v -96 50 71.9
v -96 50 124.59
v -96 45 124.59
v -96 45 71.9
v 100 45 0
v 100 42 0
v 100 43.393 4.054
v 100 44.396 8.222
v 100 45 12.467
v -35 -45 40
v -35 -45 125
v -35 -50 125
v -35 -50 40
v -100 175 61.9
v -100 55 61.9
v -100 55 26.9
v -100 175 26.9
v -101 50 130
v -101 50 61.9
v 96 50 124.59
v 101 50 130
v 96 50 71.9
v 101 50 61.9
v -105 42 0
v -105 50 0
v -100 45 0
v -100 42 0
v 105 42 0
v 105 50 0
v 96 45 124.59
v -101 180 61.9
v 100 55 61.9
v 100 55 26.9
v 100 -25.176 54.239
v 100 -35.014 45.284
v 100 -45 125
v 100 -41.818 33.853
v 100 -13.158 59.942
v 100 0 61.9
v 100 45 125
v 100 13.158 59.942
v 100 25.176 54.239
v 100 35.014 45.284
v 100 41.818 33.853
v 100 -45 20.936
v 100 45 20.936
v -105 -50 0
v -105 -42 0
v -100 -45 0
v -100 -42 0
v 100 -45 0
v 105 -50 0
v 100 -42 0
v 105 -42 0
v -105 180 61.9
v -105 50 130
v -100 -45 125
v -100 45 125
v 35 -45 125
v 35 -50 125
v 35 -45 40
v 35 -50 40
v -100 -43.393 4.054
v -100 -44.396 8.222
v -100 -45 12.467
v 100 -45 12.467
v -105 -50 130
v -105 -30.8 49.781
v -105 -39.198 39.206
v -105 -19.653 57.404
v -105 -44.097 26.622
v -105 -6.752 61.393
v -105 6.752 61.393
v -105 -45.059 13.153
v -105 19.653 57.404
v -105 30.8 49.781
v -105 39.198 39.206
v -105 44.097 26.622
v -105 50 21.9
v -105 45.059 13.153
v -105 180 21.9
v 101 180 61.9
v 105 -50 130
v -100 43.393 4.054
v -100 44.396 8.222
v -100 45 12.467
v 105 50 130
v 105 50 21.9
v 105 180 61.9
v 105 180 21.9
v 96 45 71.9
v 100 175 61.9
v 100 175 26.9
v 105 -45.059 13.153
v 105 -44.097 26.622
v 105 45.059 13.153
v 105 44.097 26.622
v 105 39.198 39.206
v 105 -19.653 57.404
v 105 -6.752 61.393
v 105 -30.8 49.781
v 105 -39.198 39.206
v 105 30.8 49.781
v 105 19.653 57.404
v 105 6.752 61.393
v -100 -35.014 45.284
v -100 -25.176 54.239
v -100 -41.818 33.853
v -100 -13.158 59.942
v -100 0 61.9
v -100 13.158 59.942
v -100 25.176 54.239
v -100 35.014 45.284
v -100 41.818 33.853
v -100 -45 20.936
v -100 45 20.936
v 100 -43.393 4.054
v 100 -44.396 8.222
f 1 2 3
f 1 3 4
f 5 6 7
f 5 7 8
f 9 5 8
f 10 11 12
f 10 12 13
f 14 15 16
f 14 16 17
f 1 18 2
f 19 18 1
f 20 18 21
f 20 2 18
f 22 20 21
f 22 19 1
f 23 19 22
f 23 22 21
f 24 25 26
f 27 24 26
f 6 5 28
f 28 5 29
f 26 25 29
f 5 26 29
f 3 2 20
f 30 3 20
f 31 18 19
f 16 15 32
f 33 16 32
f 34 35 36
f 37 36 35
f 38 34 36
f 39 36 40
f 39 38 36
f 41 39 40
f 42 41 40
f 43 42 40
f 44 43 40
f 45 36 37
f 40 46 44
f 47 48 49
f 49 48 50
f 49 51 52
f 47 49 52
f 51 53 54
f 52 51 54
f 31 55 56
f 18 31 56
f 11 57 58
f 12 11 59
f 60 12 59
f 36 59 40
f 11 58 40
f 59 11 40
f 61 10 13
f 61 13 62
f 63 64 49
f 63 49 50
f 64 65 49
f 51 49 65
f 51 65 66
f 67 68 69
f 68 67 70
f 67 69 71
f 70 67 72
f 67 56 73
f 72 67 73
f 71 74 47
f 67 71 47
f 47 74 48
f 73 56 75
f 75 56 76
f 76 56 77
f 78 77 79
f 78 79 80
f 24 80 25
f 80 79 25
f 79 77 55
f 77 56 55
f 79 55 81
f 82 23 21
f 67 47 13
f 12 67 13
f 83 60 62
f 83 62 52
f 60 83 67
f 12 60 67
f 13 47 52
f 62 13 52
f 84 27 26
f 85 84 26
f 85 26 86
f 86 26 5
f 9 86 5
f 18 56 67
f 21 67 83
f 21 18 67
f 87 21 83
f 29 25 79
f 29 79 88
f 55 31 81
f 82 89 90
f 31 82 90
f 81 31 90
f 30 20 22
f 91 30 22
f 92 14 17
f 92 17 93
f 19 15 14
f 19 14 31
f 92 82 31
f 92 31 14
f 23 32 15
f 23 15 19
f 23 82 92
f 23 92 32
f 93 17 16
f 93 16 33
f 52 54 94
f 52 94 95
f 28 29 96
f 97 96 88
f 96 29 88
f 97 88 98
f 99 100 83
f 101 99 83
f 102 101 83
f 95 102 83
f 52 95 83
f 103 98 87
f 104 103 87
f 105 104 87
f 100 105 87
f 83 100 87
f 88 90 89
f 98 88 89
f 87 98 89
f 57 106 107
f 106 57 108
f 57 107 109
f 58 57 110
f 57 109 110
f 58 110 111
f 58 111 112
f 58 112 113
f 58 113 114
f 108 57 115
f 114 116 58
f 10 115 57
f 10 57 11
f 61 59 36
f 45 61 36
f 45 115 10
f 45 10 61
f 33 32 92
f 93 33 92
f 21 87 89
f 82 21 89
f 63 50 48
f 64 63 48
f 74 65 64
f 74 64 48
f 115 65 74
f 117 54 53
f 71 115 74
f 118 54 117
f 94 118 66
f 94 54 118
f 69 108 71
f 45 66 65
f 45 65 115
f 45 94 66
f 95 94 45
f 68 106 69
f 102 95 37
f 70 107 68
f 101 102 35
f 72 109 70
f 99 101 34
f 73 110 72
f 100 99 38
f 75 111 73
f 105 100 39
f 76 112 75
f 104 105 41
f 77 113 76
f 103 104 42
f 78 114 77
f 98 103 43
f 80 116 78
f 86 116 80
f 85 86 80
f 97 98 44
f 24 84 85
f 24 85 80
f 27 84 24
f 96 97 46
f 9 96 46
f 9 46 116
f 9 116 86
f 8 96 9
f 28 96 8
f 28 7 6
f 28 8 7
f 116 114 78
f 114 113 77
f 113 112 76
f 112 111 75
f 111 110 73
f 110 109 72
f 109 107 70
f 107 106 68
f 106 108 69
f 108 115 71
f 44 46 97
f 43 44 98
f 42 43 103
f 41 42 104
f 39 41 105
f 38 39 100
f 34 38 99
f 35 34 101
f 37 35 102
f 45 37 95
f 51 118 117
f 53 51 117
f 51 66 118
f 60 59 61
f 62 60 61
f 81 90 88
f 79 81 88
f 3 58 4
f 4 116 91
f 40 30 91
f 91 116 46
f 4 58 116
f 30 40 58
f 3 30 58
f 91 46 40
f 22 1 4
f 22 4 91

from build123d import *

# Parameters (mm, degrees)
SKETCH_2_W          = 210
SKETCH_2_H          = 100
EXTRUDE_1_DEPTH     = 130
SKETCH_3_W          = 200
SKETCH_3_H          = 90
CUT_EXTRUDE_1_DEPTH = 125
SKETCH_4_W          = 70
SKETCH_4_H          = 85
CUT_EXTRUDE_2_DEPTH = 125
CUT_EXTRUDE_4_DEPTH = 150
EXTRUDE_3_DEPTH     = 210
SKETCH_7_W          = 200
SKETCH_7_H          = 120
CUT_EXTRUDE_7_DEPTH = 35
EXTRUDE_6_DEPTH     = 4
EXTRUDE_7_DEPTH     = 4
SKETCH_13_W         = 192
SKETCH_13_H         = 52.689697424
CUT_EXTRUDE_9_DEPTH = 5


with BuildPart() as part:
    # 草图2 → 凸台-拉伸1 (new body)
    with BuildSketch(Plane.XY):
        Rectangle(SKETCH_2_W, SKETCH_2_H)
    extrude(amount=EXTRUDE_1_DEPTH)

    # 草图3 → 切除-拉伸1 (cut)
    with BuildSketch(Plane.XY):
        Rectangle(SKETCH_3_W, SKETCH_3_H)
    extrude(amount=CUT_EXTRUDE_1_DEPTH, mode=Mode.SUBTRACT)

    # 草图4 → 切除-拉伸2 (cut)
    with BuildSketch(Plane(origin=(0, 0, 0), x_dir=(1, 0, 0), z_dir=(0, 1, 0))):
        with Locations((0, -82.5)):
            Rectangle(SKETCH_4_W, SKETCH_4_H)
    extrude(amount=-CUT_EXTRUDE_2_DEPTH, mode=Mode.SUBTRACT)

    # 草图5 → 切除-拉伸4 (cut, symmetric)
    with BuildSketch(Plane(origin=(0, 0, 0), x_dir=(0, 0, -1), z_dir=(1, 0, 0))):
        with BuildLine():
            Line((0, 42), (0, -42))
            ThreePointArc((0, -42), (-61.900064838, 0), (0, 42))
        make_face()
    extrude(amount=CUT_EXTRUDE_4_DEPTH, both=True, mode=Mode.SUBTRACT)

    # 草图6 → 凸台-拉伸3 (add)
    with BuildSketch(Plane(origin=(105, 0, 0), x_dir=(0, 0, -1), z_dir=(1, 0, 0))):
        Polygon((-61.900064838, 50), (-61.900064838, 174.615745143), (-61.900064838, 180), (-21.900064838, 180), (-21.900064838, 50), align=None)
    extrude(amount=-EXTRUDE_3_DEPTH)

    # 草图7 → 切除-拉伸7 (cut)
    with BuildSketch(Plane.XY.offset(61.900064838)):
        with Locations((0, 115)):
            Rectangle(SKETCH_7_W, SKETCH_7_H)
    extrude(amount=-CUT_EXTRUDE_7_DEPTH, mode=Mode.SUBTRACT)

    # 草图11 → 凸台-拉伸6 (add)
    with BuildSketch(Plane(origin=(105, 0, 0), x_dir=(0, 0, -1), z_dir=(1, 0, 0))):
        Polygon((-130, 50), (-61.900064838, 180), (-61.900064838, 50), align=None)
    extrude(amount=-EXTRUDE_6_DEPTH)

    # 草图12 → 凸台-拉伸7 (add)
    with BuildSketch(Plane.ZY.offset(105)):
        Polygon((61.900064838, 180), (130, 50), (61.900064838, 50), align=None)
    extrude(amount=-EXTRUDE_7_DEPTH)

    # 草图13 → 切除-拉伸9 (cut)
    with BuildSketch(Plane(origin=(0, 50, 0), x_dir=(1, 0, 0), z_dir=(0, 1, 0))):
        with Locations((0, -98.24491355)):
            Rectangle(SKETCH_13_W, SKETCH_13_H)
    extrude(amount=-CUT_EXTRUDE_9_DEPTH, mode=Mode.SUBTRACT)


solid = part.part
